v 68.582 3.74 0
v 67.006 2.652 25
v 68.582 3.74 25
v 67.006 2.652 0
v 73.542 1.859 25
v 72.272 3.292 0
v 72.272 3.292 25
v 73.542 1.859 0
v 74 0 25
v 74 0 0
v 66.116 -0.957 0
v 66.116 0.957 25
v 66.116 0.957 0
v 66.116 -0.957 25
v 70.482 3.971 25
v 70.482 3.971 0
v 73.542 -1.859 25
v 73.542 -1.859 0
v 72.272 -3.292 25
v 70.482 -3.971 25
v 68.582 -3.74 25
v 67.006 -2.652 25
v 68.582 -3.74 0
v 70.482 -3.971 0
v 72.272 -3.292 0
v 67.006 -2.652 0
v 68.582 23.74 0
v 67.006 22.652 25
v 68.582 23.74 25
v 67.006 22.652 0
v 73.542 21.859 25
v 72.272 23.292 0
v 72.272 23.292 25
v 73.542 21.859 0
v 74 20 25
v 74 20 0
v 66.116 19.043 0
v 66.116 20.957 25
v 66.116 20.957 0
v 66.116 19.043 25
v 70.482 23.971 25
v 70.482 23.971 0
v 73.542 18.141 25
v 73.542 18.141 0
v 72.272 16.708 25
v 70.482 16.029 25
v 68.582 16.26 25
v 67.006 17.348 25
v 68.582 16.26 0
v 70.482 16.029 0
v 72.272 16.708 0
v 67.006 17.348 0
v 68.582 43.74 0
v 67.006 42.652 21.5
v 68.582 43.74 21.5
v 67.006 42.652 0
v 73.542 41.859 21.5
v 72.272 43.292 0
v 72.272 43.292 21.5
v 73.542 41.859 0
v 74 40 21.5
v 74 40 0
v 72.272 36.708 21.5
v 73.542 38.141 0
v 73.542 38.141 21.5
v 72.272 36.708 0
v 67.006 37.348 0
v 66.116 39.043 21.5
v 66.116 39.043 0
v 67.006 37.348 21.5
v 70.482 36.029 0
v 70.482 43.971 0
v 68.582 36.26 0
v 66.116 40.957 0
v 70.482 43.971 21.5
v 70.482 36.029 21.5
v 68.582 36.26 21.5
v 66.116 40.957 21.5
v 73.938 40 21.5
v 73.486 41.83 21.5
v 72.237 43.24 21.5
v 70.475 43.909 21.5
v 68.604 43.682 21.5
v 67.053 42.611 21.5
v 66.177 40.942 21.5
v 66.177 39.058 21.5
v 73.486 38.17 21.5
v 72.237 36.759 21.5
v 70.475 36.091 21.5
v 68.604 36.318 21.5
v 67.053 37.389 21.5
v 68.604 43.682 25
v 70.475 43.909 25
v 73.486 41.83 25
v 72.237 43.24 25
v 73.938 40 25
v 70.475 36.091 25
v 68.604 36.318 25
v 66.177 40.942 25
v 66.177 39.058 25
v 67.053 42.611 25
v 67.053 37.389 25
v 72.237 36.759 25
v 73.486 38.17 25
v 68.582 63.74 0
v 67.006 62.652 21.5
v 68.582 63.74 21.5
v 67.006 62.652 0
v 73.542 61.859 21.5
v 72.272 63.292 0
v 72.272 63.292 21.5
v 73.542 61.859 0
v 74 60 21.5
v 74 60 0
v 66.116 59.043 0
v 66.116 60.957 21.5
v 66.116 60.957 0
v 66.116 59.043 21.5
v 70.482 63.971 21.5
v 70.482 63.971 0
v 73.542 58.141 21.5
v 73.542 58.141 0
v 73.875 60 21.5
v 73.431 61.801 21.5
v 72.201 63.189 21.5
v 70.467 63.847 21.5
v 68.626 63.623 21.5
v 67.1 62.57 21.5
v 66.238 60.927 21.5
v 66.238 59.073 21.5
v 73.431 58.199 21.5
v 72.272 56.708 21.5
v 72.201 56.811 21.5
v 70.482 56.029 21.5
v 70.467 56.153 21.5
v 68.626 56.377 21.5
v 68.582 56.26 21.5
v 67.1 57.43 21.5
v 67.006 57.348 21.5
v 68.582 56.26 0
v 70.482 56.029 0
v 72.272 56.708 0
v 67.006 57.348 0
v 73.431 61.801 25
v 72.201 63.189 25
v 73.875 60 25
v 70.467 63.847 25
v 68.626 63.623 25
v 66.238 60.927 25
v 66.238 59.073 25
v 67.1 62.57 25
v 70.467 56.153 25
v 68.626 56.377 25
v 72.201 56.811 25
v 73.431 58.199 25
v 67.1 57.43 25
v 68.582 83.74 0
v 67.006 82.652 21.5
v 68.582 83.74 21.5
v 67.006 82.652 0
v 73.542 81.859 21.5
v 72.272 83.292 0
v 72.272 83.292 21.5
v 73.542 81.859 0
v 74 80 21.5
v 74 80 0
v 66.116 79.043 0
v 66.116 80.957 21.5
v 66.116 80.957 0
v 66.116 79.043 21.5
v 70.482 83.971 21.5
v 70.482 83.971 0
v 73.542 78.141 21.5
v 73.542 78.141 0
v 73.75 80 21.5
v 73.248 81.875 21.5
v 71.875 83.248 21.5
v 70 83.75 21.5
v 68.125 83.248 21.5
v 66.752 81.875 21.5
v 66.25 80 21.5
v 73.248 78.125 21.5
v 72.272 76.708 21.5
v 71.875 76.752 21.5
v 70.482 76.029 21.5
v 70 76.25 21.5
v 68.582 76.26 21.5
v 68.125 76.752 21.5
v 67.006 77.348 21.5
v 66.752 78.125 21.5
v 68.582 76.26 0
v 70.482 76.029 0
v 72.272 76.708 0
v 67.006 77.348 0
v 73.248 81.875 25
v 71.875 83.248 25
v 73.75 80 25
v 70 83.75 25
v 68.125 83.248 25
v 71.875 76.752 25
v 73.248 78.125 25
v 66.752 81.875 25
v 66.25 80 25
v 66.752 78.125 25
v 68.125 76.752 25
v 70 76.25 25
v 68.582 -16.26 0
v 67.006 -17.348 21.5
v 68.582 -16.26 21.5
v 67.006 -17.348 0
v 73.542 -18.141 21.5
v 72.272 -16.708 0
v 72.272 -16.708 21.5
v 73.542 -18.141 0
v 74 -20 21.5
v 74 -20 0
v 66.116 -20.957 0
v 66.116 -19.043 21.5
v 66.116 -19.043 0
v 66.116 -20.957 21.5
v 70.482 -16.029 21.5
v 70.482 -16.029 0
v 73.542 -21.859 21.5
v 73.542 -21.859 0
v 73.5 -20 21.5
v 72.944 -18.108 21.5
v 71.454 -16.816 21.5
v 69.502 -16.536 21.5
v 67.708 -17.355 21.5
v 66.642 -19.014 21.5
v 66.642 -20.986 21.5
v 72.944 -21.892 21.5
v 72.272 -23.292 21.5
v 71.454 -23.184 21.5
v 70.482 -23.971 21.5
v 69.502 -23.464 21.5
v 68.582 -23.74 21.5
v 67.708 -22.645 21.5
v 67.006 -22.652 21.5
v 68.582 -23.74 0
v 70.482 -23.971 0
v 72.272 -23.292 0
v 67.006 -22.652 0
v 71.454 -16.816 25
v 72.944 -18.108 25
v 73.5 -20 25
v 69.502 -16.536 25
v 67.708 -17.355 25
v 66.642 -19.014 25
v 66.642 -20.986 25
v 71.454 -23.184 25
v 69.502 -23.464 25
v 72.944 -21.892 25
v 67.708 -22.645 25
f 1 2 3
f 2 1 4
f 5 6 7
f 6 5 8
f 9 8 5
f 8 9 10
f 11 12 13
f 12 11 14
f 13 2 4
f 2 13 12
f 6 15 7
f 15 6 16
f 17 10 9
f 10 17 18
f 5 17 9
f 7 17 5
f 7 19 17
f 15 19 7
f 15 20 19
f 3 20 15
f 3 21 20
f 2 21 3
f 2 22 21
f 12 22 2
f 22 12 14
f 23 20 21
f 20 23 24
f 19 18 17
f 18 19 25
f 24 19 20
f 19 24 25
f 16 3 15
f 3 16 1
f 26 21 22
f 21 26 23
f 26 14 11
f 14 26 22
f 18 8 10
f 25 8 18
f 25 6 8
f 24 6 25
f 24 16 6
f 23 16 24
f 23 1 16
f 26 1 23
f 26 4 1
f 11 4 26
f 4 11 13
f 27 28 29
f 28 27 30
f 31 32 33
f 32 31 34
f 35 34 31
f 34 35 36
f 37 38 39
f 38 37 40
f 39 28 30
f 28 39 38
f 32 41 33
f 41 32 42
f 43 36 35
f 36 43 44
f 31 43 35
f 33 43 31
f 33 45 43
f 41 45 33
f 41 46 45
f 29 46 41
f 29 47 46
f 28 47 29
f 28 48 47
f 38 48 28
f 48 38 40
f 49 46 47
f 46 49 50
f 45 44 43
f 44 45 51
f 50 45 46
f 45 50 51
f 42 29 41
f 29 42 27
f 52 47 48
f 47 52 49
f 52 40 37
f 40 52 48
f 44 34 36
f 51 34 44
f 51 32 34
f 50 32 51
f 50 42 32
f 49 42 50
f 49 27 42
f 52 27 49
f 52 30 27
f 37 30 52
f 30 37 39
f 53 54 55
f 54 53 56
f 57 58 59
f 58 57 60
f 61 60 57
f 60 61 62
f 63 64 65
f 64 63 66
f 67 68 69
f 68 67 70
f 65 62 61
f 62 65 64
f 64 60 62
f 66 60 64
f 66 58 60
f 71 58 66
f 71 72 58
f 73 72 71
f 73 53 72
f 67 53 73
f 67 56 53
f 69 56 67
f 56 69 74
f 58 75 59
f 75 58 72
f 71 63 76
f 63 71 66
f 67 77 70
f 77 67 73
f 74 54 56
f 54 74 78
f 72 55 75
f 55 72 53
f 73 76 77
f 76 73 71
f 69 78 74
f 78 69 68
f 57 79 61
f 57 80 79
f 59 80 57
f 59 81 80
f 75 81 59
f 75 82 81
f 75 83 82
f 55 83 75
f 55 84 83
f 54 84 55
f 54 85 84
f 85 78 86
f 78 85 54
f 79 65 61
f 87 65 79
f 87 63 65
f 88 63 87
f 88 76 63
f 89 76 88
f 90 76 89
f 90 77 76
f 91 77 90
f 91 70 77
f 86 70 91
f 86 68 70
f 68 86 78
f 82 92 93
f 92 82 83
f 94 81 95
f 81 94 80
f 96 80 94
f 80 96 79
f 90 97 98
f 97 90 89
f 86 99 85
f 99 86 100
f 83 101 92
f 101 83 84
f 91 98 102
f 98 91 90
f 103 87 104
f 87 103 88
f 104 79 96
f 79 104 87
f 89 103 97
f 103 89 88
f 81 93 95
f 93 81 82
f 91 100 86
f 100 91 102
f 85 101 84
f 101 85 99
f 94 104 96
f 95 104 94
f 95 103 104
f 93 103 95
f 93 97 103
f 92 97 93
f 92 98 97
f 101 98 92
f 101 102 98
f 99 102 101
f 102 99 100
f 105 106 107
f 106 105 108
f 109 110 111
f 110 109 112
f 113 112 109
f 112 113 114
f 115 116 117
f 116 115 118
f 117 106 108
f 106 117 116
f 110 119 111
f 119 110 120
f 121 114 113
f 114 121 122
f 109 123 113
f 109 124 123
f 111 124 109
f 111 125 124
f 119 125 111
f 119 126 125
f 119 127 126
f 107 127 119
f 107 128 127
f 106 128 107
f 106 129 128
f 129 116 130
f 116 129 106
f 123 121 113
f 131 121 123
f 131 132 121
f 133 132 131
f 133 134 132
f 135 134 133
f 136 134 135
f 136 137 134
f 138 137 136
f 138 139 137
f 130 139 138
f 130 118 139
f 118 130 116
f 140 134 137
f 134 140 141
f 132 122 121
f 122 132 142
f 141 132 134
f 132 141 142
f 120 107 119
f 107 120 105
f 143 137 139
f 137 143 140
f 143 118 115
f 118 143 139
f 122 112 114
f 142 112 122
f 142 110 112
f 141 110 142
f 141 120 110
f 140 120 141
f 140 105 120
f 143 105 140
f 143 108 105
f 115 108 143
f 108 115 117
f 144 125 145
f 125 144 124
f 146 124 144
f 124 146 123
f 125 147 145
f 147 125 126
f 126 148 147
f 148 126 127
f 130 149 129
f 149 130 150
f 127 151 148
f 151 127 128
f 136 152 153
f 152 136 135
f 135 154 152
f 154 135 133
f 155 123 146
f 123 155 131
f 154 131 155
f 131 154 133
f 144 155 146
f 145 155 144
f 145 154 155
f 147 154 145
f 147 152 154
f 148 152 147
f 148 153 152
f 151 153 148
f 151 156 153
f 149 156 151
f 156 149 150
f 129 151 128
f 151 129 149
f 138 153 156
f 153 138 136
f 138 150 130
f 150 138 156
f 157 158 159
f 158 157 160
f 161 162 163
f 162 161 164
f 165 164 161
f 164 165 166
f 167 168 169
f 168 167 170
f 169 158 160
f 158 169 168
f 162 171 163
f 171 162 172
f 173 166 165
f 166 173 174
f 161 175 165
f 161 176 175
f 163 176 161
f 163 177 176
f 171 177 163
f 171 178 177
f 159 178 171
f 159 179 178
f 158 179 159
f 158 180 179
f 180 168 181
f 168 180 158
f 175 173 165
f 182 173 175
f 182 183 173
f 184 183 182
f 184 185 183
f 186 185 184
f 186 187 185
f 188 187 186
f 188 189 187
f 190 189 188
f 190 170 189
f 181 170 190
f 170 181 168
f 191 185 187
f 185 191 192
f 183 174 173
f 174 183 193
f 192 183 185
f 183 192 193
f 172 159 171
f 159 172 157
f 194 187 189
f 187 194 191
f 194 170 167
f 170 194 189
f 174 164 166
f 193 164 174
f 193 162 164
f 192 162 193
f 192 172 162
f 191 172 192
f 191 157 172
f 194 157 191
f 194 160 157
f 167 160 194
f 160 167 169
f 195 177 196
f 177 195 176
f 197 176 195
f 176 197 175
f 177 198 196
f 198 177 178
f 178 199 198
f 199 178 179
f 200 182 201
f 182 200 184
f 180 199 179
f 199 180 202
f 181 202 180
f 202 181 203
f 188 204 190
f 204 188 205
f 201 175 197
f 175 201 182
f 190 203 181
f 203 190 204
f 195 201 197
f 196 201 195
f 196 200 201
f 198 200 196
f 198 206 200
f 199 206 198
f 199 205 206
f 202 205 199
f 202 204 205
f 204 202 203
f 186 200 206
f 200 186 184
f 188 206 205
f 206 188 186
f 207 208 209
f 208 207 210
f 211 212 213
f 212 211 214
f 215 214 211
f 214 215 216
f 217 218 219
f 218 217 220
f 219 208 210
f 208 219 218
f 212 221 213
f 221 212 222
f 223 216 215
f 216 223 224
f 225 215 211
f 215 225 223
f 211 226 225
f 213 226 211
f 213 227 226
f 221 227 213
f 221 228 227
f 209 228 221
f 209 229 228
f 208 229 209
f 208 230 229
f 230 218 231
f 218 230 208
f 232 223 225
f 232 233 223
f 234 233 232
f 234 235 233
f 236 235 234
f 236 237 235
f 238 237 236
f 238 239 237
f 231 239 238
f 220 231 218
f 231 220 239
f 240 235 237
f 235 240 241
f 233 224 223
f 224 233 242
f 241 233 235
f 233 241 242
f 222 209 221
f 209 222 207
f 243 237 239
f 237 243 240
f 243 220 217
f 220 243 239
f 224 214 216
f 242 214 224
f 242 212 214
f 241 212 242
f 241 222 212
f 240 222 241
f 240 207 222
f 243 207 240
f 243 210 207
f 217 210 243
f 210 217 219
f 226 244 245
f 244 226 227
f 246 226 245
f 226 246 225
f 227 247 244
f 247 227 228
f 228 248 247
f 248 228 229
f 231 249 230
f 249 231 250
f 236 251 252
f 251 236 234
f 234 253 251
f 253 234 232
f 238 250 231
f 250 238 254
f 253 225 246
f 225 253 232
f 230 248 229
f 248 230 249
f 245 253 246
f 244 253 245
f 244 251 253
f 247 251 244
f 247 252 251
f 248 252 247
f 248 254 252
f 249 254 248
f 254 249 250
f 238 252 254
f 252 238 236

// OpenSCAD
bearing_h = 7;
bearing_r = 11;
bearing_ri = 4;

hub_thickness = 5;
wheel_r = 50;
tire_r = 5;
rim_ri = 45;
spoke_r = 2;
crank_thickness = 2;
crank_l = 30;
axle_l = 50;

module cylinder_outer(h,r,center,fn){
    fudge = 1/cos(180/fn);
    cylinder(h=h,r=r*fudge,center=center,$fn=fn);
}
   
module ring(h, ri, ro) {
    difference() {
        cylinder(h, r=ro, center=true);
        cylinder(h, r=ri, center=true);
    }
}

module ring2(h, ri, t) {
    difference() {
        cylinder(h, r=ri+t, center=true);
        cylinder(h, r=ri, center=true);
    }
}

module wheel() {
    // hub
    ring(bearing_h, bearing_ri, bearing_r+hub_thickness);
    //cylinder(h=bearing_h, r=bearing_r+hub_thickness, center=true);
    
    // tire
    rotate_extrude() {
        translate([wheel_r, 0, 0])
        circle(tire_r);
    }

    // rim
    ring(bearing_h, rim_ri, wheel_r);

    // spokes
    for (a = [0:18:360]) {
        rotate([90, 0, a])
        translate([0, 0, bearing_r])
        cylinder(h=wheel_r-bearing_r, r=spoke_r, center=false);
    }
    
    // axle
    cylinder(h=axle_l/2, r=bearing_ri, center=false);
}

module crank() {
    difference() {
        union() {
            translate([0, crank_l/2, 0]) cube([(bearing_r+crank_thickness)*2, crank_l, bearing_h], center=true);
            translate([0, crank_l, 0]) cylinder(h=bearing_h, r=bearing_r+crank_thickness, center=true);
            cylinder(h=bearing_h, r=bearing_r+crank_thickness, center=true);
        }
        translate([0, crank_l, 0]) cylinder_outer(h=bearing_h, r=bearing_r, center=true, fn=30);
        cylinder_outer(h=bearing_h, r=bearing_ri, center=true, fn=13);
    }

    
    //pin
    //translate([0, 0, -7.5]) cylinder(h=15, r=1.5, center=true);
}
crank_z = axle_l/2 - bearing_h/2;

tube_r = 4;
fork_h = 63;
fork_w = 25;
post_h = 60;
module frame() {
    difference() {
        union() {
            translate([0, 0, fork_w/2])
                rotate([90, 0, -90])
                cylinder(h=fork_h, r=tube_r);
            translate([0, 0, -fork_w/2])
                rotate([90, 0, -90])
                cylinder(h=fork_h, r=tube_r);
            translate([-fork_h, 0, 0])
                cylinder(h=fork_w, r=tube_r, center=true);
            translate([-fork_h, 0, fork_w/2])
                sphere(r=tube_r);
            translate([-fork_h, 0, -fork_w/2])
                sphere(r=tube_r);
            translate([-fork_h, 0, 0])
                rotate([90, 0, -90])
                cylinder(h=post_h, r=tube_r);
            translate([0, 0, fork_w/2])
                cylinder(h=bearing_h, r=bearing_r+hub_thickness, center=true);
            translate([0, 0, -fork_w/2])
                cylinder(h=bearing_h, r=bearing_r+hub_thickness, center=true);
        }
        cylinder_outer(h=fork_w+2*bearing_h, r=bearing_r, center=true, fn=30);
    }
}

pedal_l = 20;
pedal_w = 15;

module pedal() {
    cylinder(h=bearing_h+2.5, r=bearing_ri);
    translate([0, 0, bearing_h+1.5+pedal_l/2]) difference() {
        cube([6, pedal_w, pedal_l], center=true);
        translate([0, -3.25, 0]) cube([6, 4.5, 16], center=true);
        translate([0, 3.25, 0]) cube([6, 4.5, 16], center=true);
        
        //translate([0, -8, 0]) cube([bearing_ri*2+1.5, 6, 38], center=true);
        //translate([0, 8, 0]) cube([bearing_ri*2+1.5, 6, 38], center=true);
    }
}

module seat() {
    translate([-50, 0, 0]) intersection() {
        ring(h=25, ri=48, ro=52);
        translate([50, 0, 0]) cube([25, 65, 25], center=true);
    }
    //cube([10, 80, 50], center=true);
}


// Assembled
/*
color("green") wheel();
// second axle
translate([0, 0, -axle_l/2]) cylinder(h=axle_l/2, r=bearing_ri, center=false);

translate([0, 0, crank_z]) crank();
rotate([180, 0, 0]) translate([0, 0, crank_z]) crank();

frame();

translate([0, crank_l, crank_z-bearing_h/2]) pedal();
rotate([180,0,0]) translate([0, crank_l, crank_z-bearing_h/2]) pedal();

translate([-(fork_h+post_h), 0, 0]) seat();
*/

// exploded
/*
$fs=2;
$fa=12;
*/
//wheel();
translate([70, 0, 0]) cylinder(h=axle_l/2, r=bearing_ri);
translate([70, 20, 0]) cylinder(h=axle_l/2, r=bearing_ri);
// fudged axles
translate([70, 40, 0]) cylinder(h=axle_l/2-bearing_h/2, r=bearing_ri);
translate([70, 40, axle_l/2-bearing_h/2]) cylinder(h=bearing_h/2, r=bearing_ri-0.0625);
translate([70, 60, 0]) cylinder(h=axle_l/2-bearing_h/2, r=bearing_ri);
translate([70, 60, axle_l/2-bearing_h/2]) cylinder(h=bearing_h/2, r=bearing_ri-0.125);
translate([70, 80, 0]) cylinder(h=axle_l/2-bearing_h/2, r=bearing_ri);
translate([70, 80, axle_l/2-bearing_h/2]) cylinder(h=bearing_h/2, r=bearing_ri-0.25);
translate([70, -20, 0]) cylinder(h=axle_l/2-bearing_h/2, r=bearing_ri);
translate([70, -20, axle_l/2-bearing_h/2]) cylinder(h=bearing_h/2, r=bearing_ri-0.5);

/*translate([95, 0, 0]) crank();
translate([130, 0, 0]) crank();
translate([0, 100, 0]) rotate([0, 0, 180]) {
    frame();
    translate([-(fork_h+post_h), 0, 0]) seat();
}
translate([125, -30, 0]) rotate([180, 0, 0]) pedal();
translate([105, -30, 0]) rotate([180, 0, 0]) pedal();*/
